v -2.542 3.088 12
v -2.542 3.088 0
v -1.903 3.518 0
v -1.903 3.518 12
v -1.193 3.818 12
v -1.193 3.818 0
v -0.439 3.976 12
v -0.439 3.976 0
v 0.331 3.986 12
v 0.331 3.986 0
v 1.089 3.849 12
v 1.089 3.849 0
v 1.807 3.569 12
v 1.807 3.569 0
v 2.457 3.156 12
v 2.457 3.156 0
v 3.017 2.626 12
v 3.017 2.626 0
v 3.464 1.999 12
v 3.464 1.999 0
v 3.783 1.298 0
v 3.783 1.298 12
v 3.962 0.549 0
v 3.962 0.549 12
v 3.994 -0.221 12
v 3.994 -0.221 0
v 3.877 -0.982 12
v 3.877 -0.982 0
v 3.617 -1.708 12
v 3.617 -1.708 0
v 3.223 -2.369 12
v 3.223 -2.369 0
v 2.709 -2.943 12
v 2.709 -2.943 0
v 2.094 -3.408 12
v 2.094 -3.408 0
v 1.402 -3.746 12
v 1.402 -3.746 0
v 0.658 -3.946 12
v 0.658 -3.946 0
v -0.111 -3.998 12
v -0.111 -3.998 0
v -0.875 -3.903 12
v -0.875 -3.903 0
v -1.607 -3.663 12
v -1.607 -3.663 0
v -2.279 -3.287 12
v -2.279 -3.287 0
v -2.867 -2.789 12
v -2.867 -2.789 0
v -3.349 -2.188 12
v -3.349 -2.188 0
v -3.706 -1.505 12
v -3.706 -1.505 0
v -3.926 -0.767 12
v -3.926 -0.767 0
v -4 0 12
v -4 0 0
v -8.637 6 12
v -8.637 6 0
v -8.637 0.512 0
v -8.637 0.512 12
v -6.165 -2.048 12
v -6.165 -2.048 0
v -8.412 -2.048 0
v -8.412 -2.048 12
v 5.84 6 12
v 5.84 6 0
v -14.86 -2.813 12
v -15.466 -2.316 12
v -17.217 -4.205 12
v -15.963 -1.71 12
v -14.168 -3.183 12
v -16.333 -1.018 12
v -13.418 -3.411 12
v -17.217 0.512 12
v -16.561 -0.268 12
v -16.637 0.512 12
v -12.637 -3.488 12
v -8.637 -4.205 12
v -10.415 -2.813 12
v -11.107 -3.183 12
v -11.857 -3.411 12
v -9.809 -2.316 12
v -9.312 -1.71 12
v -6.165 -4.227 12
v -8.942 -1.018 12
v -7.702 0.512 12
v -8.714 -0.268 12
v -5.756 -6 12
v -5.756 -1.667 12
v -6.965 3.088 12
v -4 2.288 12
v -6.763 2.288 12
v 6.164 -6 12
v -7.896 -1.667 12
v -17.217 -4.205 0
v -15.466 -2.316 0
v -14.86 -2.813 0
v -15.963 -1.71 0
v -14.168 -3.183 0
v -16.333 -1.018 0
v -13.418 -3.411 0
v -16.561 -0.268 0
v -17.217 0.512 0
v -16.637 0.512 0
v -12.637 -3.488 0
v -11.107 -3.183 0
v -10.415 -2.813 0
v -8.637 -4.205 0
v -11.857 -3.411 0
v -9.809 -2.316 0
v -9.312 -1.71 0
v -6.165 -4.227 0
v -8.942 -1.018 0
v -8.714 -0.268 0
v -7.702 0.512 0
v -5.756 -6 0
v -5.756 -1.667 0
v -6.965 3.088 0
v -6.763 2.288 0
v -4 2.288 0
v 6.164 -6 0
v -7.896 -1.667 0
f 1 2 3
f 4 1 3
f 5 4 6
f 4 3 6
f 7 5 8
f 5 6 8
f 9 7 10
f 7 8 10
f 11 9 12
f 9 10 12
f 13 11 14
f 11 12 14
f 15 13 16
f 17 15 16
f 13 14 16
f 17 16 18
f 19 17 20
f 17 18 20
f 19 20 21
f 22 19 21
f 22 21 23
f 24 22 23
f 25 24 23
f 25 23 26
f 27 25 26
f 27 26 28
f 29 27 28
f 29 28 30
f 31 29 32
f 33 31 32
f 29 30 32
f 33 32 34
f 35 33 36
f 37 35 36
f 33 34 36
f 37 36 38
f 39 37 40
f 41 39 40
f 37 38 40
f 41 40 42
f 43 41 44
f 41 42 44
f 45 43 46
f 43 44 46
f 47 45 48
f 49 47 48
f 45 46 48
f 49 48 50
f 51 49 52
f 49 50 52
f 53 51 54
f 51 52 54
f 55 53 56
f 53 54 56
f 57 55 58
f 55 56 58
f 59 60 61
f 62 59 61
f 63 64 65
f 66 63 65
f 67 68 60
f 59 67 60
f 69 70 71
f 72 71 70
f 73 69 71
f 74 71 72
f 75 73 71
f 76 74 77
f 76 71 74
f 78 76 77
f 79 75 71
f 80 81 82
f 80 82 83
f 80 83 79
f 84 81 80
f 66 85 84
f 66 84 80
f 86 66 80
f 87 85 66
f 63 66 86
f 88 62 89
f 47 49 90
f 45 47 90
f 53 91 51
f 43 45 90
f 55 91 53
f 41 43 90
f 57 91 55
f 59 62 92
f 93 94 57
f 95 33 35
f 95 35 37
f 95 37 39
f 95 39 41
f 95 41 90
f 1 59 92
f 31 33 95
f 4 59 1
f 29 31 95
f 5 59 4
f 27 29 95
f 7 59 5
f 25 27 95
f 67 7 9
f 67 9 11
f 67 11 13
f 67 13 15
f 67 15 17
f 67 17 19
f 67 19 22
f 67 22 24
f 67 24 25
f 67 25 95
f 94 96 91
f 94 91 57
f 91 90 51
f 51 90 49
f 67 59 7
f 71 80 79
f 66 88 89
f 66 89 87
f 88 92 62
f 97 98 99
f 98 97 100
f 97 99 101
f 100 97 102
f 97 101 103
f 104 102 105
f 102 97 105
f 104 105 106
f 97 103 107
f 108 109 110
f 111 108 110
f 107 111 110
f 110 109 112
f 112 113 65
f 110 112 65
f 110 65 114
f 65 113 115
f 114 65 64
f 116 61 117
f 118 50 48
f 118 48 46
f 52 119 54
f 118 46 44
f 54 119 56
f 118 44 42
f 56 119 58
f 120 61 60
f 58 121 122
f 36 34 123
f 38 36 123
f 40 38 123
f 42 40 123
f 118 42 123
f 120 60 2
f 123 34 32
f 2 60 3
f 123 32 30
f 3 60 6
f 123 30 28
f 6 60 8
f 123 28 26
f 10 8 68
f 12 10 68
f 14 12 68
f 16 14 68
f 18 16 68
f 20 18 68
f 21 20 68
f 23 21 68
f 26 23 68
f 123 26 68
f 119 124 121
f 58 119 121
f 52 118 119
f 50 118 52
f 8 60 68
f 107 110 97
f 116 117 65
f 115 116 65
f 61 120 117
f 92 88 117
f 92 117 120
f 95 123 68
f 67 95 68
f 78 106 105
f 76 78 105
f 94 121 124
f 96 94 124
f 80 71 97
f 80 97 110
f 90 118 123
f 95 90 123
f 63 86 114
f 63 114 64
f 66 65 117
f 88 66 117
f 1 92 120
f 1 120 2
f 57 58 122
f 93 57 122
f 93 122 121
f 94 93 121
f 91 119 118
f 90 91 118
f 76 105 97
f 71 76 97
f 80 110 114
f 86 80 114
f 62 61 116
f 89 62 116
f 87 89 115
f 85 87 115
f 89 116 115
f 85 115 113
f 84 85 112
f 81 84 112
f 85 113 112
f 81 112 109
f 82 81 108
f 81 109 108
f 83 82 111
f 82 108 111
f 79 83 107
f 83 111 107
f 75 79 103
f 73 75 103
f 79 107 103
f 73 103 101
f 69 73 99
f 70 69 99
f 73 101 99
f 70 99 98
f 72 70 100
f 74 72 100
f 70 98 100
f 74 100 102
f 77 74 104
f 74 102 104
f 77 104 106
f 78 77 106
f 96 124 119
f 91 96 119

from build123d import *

# Parameters (mm, degrees)
F1_DEPTH = 12


with BuildPart() as f1:
    # F0 (on Top) → F1 (new body)
    with BuildSketch(Plane.XY):
        with BuildLine():
            ThreePointArc((-2.542081, 3.088337), (3.617204, -1.707582), (-4, 0))
            Line((-4, 0), (-4, 2.288375))
            Line((-4, 2.288375), (-6.763066, 2.288375))
            Line((-6.763066, 2.288375), (-7.895562, -1.667487))
            Line((-7.895562, -1.667487), (-5.755623, -1.667487))
            Line((-5.755623, -1.667487), (-5.755623, -6))
            Line((-5.755623, -6), (6.164354, -6))
            Line((6.164354, -6), (5.840028, 6))
            Line((5.840028, 6), (-8.637475, 6))
            Line((-8.637475, 6), (-8.637475, 0.512484))
            ThreePointArc((-8.637475, 0.512484), (-12.637475, -3.487516), (-16.637475, 0.512484))
            Line((-16.637475, 0.512484), (-17.216573, 0.512484))
            Line((-17.216573, 0.512484), (-17.216573, -4.205178))
            Line((-17.216573, -4.205178), (-8.637475, -4.205178))
            Line((-8.637475, -4.205178), (-6.16524, -4.227431))
            Line((-6.16524, -4.227431), (-6.16524, -2.048139))
            Line((-6.16524, -2.048139), (-8.411505, -2.048139))
            Line((-8.411505, -2.048139), (-7.701935, 0.512484))
            Line((-7.701935, 0.512484), (-6.964513, 3.088337))
            Line((-6.964513, 3.088337), (-2.542081, 3.088337))
        make_face()
    extrude(amount=F1_DEPTH)


solid = f1.part
